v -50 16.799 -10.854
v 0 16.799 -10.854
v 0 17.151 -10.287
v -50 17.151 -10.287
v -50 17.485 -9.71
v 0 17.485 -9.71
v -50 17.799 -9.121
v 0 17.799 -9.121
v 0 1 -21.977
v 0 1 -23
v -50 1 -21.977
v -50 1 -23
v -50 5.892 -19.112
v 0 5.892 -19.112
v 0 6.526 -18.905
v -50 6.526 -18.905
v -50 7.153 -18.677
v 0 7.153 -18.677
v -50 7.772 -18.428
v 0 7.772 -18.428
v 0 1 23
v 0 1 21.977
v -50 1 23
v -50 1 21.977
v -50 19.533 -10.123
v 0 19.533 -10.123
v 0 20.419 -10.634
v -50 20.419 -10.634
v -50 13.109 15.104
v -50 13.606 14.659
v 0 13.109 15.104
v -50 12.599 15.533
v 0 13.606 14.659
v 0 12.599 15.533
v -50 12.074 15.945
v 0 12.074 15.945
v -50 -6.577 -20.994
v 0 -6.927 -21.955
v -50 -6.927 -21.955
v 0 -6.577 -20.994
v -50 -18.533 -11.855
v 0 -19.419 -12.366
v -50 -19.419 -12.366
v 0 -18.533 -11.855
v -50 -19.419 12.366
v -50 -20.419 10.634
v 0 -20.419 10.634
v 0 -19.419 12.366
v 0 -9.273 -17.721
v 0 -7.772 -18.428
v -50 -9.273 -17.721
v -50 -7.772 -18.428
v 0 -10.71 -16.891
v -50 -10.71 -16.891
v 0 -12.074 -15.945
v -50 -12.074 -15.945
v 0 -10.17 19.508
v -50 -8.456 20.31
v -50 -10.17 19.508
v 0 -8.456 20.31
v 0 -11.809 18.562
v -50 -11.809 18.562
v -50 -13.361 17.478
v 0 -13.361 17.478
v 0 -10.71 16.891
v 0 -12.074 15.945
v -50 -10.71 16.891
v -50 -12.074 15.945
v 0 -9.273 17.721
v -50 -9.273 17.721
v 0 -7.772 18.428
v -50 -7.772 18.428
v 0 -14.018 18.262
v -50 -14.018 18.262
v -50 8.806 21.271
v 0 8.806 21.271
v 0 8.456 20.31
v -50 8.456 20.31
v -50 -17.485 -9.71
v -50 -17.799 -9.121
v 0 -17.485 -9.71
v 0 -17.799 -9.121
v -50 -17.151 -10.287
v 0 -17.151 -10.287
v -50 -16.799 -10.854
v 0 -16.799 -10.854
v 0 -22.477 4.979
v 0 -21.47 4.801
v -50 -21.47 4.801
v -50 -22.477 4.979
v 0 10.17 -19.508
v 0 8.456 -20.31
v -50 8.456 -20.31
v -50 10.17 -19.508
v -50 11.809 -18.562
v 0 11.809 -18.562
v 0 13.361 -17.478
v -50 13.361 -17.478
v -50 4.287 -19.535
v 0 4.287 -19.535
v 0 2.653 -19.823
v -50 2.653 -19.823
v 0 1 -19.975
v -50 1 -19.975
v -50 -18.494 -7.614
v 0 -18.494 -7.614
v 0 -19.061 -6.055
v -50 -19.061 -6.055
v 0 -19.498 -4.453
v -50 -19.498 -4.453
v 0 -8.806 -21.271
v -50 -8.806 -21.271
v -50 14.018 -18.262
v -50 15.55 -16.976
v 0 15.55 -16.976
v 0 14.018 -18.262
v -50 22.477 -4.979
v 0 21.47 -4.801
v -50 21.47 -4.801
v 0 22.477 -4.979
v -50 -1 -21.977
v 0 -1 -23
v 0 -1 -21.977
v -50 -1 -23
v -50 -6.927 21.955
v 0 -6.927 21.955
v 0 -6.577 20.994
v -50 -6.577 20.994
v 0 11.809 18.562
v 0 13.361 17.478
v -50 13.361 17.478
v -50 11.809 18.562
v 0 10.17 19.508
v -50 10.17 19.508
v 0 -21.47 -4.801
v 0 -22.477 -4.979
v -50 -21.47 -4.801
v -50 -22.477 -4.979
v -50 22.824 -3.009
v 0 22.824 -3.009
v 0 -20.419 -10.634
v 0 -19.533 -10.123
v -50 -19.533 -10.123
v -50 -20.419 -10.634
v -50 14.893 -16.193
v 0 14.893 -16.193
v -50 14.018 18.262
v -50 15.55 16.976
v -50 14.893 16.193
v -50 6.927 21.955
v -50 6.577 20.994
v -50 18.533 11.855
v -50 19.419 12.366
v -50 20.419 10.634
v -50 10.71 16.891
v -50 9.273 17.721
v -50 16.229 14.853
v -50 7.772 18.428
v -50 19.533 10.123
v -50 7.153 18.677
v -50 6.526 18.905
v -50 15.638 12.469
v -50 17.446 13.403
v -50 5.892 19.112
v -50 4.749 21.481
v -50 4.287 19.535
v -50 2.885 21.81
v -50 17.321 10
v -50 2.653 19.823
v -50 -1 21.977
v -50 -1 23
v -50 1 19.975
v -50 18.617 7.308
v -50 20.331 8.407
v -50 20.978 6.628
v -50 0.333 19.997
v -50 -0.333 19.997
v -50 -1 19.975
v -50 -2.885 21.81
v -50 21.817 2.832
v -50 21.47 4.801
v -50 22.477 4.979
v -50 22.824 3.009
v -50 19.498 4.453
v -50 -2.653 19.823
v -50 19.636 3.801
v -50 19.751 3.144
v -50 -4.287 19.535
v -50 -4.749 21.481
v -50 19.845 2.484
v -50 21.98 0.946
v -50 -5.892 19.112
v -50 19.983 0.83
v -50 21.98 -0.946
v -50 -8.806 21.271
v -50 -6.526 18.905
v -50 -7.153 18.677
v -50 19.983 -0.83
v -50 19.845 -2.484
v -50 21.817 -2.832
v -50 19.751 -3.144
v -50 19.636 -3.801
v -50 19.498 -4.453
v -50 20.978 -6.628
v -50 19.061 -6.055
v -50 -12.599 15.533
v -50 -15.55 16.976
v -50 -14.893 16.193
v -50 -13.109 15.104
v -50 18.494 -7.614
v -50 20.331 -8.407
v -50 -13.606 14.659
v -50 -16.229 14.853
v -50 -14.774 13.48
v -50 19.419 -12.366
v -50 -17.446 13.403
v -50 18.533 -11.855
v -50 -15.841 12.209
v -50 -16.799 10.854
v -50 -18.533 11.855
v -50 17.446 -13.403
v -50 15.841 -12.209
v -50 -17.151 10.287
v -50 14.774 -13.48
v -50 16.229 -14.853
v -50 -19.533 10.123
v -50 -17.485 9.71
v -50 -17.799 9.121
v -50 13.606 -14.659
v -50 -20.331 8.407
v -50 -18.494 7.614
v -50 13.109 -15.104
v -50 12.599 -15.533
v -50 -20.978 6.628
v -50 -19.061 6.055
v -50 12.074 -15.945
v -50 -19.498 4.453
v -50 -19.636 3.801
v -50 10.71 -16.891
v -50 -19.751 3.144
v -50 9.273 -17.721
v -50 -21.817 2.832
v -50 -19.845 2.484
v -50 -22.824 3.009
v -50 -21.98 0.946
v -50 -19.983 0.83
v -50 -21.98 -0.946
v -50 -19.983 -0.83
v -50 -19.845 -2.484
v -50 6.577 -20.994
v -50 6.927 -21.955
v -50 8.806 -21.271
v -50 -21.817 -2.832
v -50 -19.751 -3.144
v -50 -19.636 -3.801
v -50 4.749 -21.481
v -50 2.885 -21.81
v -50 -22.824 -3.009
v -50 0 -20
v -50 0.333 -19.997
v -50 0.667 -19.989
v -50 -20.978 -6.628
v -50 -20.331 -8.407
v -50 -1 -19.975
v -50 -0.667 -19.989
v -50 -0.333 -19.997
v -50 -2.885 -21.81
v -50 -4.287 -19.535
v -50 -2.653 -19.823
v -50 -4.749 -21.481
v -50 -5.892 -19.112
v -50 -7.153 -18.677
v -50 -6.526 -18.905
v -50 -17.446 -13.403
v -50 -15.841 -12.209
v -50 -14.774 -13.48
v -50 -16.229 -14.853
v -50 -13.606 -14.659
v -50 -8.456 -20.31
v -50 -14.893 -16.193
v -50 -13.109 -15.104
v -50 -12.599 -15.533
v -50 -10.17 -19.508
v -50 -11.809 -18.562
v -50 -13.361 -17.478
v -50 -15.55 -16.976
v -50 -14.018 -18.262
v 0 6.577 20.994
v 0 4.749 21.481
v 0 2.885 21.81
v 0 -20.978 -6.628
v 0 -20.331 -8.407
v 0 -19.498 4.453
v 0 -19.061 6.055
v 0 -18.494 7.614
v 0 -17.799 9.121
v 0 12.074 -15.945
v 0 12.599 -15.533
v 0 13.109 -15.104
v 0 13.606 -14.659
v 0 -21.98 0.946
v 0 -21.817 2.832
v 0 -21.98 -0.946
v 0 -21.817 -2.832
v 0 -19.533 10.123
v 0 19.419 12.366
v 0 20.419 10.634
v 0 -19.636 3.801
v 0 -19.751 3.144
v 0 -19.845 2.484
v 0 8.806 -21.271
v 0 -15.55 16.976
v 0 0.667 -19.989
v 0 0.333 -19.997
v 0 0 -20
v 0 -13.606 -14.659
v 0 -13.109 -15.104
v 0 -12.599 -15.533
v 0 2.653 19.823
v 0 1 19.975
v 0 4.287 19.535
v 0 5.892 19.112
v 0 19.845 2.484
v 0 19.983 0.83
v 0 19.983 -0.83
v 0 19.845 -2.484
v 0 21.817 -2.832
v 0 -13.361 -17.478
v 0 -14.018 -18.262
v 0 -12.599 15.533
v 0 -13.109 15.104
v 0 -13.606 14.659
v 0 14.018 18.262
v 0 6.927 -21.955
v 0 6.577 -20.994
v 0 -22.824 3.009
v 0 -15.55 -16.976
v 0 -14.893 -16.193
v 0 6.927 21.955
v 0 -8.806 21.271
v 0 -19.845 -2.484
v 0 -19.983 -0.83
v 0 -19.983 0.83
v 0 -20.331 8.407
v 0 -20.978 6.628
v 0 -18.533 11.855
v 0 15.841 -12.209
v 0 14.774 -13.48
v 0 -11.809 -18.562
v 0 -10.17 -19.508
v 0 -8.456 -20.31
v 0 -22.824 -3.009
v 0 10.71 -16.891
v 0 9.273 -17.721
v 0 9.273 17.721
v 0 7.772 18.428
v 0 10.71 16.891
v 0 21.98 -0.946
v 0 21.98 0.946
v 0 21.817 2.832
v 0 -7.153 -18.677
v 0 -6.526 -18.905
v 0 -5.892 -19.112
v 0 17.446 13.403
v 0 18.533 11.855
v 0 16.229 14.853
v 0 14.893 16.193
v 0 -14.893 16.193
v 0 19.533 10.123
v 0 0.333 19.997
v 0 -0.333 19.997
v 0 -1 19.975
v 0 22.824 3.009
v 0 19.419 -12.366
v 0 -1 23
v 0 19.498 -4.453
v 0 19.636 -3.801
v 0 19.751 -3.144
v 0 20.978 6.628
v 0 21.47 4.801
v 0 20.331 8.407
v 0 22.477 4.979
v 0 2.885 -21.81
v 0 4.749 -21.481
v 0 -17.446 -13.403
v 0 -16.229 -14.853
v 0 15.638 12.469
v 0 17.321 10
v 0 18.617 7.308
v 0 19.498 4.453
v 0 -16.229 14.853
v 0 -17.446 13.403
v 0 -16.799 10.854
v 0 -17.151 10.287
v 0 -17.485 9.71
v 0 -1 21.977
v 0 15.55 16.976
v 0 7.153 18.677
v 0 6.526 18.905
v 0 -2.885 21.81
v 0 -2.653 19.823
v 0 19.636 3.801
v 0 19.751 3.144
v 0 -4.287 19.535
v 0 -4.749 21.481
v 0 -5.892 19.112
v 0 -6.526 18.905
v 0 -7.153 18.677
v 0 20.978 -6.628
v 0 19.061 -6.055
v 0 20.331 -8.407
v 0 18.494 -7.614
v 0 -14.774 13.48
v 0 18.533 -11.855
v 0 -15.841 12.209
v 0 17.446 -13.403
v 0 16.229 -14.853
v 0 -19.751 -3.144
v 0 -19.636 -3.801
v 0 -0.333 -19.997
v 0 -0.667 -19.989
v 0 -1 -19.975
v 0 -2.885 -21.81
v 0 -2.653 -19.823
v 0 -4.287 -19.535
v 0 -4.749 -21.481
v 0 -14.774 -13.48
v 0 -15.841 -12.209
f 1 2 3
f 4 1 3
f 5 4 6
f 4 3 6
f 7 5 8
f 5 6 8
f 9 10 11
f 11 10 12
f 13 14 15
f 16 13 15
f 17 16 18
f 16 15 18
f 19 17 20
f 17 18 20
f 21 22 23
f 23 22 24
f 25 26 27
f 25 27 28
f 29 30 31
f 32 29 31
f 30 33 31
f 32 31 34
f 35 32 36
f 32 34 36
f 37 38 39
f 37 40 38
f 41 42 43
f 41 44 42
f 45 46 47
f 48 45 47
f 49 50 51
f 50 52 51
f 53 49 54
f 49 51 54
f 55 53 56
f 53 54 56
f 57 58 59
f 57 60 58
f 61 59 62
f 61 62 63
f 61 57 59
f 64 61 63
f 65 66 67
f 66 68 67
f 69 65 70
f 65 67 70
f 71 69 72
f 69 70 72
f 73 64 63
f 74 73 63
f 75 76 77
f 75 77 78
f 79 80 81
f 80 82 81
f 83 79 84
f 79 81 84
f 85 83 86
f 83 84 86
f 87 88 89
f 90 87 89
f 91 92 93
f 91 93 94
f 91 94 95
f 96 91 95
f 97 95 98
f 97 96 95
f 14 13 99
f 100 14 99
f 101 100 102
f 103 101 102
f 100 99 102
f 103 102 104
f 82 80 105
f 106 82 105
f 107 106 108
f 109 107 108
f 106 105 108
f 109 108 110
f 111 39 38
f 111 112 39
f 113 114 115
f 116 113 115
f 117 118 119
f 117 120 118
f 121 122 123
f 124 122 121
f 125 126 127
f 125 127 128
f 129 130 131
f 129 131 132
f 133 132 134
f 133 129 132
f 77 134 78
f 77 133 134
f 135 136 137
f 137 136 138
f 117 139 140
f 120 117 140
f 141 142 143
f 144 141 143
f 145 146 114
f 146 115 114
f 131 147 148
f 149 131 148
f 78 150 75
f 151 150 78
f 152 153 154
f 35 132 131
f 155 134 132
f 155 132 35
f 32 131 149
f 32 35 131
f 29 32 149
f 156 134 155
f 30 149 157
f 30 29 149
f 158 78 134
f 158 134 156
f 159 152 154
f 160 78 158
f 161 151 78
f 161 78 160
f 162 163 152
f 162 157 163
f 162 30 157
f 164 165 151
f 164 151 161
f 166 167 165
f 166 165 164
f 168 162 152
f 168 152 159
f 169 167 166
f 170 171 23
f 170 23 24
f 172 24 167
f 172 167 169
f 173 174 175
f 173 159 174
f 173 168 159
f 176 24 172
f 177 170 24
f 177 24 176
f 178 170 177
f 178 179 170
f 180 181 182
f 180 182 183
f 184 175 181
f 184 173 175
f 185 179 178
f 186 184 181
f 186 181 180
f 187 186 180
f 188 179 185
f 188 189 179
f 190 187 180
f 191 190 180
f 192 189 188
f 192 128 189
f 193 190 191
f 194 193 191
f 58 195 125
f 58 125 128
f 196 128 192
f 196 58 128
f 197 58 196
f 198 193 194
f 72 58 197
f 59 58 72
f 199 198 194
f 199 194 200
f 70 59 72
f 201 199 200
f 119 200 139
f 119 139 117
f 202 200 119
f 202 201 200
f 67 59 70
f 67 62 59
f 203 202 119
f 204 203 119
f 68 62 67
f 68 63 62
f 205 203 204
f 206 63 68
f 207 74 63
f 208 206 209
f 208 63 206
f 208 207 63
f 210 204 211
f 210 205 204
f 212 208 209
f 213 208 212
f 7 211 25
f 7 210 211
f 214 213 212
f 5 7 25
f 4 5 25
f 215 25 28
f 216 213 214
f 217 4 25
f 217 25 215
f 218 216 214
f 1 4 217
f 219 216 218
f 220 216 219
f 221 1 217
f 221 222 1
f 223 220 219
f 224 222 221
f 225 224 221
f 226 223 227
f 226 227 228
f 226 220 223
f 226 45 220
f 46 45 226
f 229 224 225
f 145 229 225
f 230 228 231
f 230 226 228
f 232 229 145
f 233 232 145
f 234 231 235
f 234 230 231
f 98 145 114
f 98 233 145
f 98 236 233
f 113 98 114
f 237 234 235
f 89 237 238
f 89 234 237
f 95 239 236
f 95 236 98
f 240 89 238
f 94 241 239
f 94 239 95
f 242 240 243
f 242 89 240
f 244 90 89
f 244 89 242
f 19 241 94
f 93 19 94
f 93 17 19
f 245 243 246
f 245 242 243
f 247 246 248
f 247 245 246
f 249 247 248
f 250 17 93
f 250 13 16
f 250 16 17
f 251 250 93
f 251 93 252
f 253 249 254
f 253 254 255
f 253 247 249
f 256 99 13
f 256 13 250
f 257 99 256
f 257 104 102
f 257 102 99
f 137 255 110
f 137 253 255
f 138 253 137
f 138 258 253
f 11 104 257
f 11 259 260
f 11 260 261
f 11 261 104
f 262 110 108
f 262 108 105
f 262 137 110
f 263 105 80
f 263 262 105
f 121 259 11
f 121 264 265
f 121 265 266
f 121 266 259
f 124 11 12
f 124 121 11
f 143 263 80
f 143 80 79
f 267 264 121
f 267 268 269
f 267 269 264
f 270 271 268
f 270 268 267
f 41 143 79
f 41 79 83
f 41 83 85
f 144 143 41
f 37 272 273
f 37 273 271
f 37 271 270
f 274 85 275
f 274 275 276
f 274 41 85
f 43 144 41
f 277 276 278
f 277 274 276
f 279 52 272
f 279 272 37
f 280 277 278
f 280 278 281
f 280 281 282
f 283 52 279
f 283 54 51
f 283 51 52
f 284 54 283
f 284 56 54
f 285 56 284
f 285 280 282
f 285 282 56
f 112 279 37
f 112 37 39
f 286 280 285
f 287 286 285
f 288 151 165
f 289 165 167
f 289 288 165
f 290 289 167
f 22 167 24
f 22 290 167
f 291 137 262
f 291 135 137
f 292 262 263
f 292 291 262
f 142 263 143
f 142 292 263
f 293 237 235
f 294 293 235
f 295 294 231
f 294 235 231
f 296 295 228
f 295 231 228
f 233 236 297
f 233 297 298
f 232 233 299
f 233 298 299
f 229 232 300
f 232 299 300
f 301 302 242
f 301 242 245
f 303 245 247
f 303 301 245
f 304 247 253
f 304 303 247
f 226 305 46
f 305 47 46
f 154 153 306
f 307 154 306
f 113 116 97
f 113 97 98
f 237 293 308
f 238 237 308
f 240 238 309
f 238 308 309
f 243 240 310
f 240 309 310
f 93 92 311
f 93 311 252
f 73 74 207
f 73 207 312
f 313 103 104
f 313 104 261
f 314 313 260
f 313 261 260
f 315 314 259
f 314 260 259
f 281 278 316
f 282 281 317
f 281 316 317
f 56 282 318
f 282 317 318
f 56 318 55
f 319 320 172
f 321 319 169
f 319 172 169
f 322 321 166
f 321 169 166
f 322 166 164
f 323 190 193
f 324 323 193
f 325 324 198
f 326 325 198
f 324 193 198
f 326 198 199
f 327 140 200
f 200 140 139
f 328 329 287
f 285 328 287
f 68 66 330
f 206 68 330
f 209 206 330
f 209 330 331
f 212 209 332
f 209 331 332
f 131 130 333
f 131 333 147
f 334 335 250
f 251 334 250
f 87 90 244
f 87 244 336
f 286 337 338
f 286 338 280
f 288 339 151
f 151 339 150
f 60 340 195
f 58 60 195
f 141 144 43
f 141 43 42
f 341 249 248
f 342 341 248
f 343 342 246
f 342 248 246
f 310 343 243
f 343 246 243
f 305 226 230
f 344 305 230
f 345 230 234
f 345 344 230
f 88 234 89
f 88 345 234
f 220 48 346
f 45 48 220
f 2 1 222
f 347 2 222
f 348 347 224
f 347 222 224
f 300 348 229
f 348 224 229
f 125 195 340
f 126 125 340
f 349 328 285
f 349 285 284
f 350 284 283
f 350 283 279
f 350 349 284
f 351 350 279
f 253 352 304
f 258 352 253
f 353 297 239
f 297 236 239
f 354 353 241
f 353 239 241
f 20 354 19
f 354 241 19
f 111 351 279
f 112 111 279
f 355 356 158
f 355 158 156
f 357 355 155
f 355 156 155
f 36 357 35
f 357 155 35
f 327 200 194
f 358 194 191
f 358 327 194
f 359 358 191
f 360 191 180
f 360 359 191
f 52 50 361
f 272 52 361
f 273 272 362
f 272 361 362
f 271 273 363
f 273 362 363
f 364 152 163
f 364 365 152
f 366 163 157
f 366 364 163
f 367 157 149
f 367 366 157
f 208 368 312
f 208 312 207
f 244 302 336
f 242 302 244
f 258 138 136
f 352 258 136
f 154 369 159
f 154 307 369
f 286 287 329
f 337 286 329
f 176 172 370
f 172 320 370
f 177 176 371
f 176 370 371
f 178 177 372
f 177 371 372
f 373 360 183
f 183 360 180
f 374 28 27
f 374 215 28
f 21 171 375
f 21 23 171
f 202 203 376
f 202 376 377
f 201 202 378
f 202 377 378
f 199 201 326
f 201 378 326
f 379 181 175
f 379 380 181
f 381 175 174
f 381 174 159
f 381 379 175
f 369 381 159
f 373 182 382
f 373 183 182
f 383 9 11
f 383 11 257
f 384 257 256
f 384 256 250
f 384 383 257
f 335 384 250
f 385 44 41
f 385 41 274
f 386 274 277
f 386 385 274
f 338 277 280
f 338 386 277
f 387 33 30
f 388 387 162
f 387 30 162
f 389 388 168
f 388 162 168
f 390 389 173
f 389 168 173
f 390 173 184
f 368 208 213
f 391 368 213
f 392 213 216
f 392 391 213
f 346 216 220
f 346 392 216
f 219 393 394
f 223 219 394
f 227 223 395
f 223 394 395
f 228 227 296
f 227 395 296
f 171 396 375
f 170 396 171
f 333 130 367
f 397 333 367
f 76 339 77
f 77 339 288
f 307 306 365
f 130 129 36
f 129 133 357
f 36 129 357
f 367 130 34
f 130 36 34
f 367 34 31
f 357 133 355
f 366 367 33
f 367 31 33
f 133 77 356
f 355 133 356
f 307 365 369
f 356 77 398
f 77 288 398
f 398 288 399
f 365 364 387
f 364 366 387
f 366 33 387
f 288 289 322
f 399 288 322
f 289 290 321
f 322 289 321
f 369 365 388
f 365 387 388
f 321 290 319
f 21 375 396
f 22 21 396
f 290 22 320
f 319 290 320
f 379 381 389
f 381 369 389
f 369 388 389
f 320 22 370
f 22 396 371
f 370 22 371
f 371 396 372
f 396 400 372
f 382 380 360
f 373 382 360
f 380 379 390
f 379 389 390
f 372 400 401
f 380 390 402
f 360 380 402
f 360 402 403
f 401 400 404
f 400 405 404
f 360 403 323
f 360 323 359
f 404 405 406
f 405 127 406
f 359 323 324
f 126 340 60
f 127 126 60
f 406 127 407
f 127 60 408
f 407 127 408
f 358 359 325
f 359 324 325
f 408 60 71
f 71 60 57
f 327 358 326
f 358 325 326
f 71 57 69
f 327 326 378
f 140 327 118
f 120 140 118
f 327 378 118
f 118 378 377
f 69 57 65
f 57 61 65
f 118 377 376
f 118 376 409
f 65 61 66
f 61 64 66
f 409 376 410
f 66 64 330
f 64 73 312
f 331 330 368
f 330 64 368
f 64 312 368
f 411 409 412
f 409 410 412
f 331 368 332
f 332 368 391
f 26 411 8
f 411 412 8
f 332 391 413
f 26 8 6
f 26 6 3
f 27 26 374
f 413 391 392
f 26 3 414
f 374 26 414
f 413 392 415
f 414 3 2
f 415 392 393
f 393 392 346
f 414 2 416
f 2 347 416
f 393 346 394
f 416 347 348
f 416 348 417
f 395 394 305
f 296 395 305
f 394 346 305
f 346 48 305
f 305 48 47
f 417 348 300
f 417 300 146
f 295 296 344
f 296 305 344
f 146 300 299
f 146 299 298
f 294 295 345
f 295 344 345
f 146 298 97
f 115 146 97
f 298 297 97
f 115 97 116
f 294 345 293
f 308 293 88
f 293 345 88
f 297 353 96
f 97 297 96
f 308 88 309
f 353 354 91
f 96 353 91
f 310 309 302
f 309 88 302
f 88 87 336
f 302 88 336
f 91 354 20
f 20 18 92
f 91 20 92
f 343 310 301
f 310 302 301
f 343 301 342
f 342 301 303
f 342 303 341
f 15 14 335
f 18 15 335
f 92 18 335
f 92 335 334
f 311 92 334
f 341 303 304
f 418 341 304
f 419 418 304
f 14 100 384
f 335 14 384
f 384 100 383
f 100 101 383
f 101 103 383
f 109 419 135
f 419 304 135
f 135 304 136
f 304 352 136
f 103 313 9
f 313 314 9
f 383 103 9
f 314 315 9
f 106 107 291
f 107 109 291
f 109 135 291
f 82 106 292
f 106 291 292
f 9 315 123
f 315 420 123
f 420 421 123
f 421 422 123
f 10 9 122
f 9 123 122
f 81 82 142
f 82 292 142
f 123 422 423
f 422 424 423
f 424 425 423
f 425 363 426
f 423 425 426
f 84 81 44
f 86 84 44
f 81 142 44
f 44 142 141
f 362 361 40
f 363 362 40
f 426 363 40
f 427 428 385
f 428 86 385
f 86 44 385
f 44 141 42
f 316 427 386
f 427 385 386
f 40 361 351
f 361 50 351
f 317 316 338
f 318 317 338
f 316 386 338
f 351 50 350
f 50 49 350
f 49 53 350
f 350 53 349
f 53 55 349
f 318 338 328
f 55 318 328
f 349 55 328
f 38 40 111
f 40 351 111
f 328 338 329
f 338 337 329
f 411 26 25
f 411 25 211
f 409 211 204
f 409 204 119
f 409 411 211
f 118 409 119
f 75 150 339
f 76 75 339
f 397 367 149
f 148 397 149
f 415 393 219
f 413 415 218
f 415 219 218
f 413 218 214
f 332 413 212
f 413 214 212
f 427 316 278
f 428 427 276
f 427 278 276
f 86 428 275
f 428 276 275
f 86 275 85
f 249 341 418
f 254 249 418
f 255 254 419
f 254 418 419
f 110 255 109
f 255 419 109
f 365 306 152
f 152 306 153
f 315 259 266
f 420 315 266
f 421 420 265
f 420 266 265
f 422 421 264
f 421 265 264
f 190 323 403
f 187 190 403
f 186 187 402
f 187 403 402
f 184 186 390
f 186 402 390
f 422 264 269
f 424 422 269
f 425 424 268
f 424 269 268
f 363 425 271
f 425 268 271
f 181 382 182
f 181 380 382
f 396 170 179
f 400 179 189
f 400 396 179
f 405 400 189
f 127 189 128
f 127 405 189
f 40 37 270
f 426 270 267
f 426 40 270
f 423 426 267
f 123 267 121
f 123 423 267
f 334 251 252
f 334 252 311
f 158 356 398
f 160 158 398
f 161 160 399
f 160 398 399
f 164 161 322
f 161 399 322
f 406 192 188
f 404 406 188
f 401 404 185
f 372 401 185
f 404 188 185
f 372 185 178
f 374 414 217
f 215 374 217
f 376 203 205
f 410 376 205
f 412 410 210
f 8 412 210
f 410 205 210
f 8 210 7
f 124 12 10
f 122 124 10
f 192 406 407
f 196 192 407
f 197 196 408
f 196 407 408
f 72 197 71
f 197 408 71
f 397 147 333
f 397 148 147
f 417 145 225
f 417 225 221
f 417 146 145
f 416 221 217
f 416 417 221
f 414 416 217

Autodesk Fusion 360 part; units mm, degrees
sketch "Sketch1" plane through (0, 0, 0) normal (0, 1, 0) x (1, 0, 0) in component "tread"
  line L0 (-50, 22) -> (0, 22)
  line L1 (0, 22) -> (0, 20)
  line L2 (0, 20) -> (-50, 20)
  line L3 (-50, 20) -> (-50, 22)
  line L4 (0, 0) -> (0, -12) construction
  dimension "d1" = 50
  dimension "d2" = 2
  dimension "d3" = 20
revolve "Revolve1" add sketch "Sketch1" angle 360 about axis through (1.75, 0, 0) along (1, 0, 0) makes body 1 in component "tread"
sketch "Sketch2" plane through (0, 0, 0) normal (0, 0, 1) x (1, 0, 0) in component "tread"
  line L0 (0, 0) -> (-50, 0)
  line L1 (0, 1) -> (-50, 1)
  line L2 (0, -1) -> (-50, -1)
  line L3 (0, -1) -> (0, 1)
  line L4 (-50, -1) -> (-50, 1)
  dimension "d5" = 50
  dimension "d6" = 1
  dimension "d7" = -1
extrude "Extrude1" add sketch "Sketch2" along normal mid plane 46 separate body makes body 2 in component "tread"
pattern_circular "C-Pattern1" count 9 over 360 about axis through (1.75, 0, 0) along (1, 0, 0) of "Extrude1" makes body 3 makes body 4 makes body 5 makes body 6 makes body 7 makes body 8 makes body 9 makes body 10 in component "tread"
sketch "Sketch3" plane through (0, 0, 0) normal (1, 0, 0) x (0, 0, -1) in component "tread"
  circle A0 centre (0, 0) radius 20
  dimension "d14" = 40
extrude "Extrude2" cut sketch "Sketch3" against normal blind 50 bodies 2 makes body 11 at (-16.6667, 1, -20.9833) in component "tread"
extrude "Extrude3" cut sketch "Sketch3" against normal blind 50 bodies 3 4 5 6 7 8 9 10 makes body 19 at (-16.6667, -13.3699, -17.4894) makes body 18 at (-33.3333, -20.4909, -4.6285) makes body 17 at (-33.3333, -18.6721, 9.6256) makes body 16 at (-16.6667, -8.4613, 20.3234) makes body 15 at (-16.6667, 6.5819, 21.0074) makes body 14 at (-16.6667, 18.5453, 11.8619) makes body 13 at (-16.6667, 21.8312, -2.834) makes body 12 at (-16.6667, 14.902, -16.2038) in component "tread"
combine "Combine1" operation add target body 1 tool bodies 5 in component "tread"
combine "Combine2" operation add target body 1 tool bodies 3 4 8 6 7 9 10 13 12 11 18 19 2 16 15 14 17 in component "tread"
component "tread" placed x (1, 0, 0) y (0, 1, 0) z (0, 0, 1) at (0, 0, 0)
